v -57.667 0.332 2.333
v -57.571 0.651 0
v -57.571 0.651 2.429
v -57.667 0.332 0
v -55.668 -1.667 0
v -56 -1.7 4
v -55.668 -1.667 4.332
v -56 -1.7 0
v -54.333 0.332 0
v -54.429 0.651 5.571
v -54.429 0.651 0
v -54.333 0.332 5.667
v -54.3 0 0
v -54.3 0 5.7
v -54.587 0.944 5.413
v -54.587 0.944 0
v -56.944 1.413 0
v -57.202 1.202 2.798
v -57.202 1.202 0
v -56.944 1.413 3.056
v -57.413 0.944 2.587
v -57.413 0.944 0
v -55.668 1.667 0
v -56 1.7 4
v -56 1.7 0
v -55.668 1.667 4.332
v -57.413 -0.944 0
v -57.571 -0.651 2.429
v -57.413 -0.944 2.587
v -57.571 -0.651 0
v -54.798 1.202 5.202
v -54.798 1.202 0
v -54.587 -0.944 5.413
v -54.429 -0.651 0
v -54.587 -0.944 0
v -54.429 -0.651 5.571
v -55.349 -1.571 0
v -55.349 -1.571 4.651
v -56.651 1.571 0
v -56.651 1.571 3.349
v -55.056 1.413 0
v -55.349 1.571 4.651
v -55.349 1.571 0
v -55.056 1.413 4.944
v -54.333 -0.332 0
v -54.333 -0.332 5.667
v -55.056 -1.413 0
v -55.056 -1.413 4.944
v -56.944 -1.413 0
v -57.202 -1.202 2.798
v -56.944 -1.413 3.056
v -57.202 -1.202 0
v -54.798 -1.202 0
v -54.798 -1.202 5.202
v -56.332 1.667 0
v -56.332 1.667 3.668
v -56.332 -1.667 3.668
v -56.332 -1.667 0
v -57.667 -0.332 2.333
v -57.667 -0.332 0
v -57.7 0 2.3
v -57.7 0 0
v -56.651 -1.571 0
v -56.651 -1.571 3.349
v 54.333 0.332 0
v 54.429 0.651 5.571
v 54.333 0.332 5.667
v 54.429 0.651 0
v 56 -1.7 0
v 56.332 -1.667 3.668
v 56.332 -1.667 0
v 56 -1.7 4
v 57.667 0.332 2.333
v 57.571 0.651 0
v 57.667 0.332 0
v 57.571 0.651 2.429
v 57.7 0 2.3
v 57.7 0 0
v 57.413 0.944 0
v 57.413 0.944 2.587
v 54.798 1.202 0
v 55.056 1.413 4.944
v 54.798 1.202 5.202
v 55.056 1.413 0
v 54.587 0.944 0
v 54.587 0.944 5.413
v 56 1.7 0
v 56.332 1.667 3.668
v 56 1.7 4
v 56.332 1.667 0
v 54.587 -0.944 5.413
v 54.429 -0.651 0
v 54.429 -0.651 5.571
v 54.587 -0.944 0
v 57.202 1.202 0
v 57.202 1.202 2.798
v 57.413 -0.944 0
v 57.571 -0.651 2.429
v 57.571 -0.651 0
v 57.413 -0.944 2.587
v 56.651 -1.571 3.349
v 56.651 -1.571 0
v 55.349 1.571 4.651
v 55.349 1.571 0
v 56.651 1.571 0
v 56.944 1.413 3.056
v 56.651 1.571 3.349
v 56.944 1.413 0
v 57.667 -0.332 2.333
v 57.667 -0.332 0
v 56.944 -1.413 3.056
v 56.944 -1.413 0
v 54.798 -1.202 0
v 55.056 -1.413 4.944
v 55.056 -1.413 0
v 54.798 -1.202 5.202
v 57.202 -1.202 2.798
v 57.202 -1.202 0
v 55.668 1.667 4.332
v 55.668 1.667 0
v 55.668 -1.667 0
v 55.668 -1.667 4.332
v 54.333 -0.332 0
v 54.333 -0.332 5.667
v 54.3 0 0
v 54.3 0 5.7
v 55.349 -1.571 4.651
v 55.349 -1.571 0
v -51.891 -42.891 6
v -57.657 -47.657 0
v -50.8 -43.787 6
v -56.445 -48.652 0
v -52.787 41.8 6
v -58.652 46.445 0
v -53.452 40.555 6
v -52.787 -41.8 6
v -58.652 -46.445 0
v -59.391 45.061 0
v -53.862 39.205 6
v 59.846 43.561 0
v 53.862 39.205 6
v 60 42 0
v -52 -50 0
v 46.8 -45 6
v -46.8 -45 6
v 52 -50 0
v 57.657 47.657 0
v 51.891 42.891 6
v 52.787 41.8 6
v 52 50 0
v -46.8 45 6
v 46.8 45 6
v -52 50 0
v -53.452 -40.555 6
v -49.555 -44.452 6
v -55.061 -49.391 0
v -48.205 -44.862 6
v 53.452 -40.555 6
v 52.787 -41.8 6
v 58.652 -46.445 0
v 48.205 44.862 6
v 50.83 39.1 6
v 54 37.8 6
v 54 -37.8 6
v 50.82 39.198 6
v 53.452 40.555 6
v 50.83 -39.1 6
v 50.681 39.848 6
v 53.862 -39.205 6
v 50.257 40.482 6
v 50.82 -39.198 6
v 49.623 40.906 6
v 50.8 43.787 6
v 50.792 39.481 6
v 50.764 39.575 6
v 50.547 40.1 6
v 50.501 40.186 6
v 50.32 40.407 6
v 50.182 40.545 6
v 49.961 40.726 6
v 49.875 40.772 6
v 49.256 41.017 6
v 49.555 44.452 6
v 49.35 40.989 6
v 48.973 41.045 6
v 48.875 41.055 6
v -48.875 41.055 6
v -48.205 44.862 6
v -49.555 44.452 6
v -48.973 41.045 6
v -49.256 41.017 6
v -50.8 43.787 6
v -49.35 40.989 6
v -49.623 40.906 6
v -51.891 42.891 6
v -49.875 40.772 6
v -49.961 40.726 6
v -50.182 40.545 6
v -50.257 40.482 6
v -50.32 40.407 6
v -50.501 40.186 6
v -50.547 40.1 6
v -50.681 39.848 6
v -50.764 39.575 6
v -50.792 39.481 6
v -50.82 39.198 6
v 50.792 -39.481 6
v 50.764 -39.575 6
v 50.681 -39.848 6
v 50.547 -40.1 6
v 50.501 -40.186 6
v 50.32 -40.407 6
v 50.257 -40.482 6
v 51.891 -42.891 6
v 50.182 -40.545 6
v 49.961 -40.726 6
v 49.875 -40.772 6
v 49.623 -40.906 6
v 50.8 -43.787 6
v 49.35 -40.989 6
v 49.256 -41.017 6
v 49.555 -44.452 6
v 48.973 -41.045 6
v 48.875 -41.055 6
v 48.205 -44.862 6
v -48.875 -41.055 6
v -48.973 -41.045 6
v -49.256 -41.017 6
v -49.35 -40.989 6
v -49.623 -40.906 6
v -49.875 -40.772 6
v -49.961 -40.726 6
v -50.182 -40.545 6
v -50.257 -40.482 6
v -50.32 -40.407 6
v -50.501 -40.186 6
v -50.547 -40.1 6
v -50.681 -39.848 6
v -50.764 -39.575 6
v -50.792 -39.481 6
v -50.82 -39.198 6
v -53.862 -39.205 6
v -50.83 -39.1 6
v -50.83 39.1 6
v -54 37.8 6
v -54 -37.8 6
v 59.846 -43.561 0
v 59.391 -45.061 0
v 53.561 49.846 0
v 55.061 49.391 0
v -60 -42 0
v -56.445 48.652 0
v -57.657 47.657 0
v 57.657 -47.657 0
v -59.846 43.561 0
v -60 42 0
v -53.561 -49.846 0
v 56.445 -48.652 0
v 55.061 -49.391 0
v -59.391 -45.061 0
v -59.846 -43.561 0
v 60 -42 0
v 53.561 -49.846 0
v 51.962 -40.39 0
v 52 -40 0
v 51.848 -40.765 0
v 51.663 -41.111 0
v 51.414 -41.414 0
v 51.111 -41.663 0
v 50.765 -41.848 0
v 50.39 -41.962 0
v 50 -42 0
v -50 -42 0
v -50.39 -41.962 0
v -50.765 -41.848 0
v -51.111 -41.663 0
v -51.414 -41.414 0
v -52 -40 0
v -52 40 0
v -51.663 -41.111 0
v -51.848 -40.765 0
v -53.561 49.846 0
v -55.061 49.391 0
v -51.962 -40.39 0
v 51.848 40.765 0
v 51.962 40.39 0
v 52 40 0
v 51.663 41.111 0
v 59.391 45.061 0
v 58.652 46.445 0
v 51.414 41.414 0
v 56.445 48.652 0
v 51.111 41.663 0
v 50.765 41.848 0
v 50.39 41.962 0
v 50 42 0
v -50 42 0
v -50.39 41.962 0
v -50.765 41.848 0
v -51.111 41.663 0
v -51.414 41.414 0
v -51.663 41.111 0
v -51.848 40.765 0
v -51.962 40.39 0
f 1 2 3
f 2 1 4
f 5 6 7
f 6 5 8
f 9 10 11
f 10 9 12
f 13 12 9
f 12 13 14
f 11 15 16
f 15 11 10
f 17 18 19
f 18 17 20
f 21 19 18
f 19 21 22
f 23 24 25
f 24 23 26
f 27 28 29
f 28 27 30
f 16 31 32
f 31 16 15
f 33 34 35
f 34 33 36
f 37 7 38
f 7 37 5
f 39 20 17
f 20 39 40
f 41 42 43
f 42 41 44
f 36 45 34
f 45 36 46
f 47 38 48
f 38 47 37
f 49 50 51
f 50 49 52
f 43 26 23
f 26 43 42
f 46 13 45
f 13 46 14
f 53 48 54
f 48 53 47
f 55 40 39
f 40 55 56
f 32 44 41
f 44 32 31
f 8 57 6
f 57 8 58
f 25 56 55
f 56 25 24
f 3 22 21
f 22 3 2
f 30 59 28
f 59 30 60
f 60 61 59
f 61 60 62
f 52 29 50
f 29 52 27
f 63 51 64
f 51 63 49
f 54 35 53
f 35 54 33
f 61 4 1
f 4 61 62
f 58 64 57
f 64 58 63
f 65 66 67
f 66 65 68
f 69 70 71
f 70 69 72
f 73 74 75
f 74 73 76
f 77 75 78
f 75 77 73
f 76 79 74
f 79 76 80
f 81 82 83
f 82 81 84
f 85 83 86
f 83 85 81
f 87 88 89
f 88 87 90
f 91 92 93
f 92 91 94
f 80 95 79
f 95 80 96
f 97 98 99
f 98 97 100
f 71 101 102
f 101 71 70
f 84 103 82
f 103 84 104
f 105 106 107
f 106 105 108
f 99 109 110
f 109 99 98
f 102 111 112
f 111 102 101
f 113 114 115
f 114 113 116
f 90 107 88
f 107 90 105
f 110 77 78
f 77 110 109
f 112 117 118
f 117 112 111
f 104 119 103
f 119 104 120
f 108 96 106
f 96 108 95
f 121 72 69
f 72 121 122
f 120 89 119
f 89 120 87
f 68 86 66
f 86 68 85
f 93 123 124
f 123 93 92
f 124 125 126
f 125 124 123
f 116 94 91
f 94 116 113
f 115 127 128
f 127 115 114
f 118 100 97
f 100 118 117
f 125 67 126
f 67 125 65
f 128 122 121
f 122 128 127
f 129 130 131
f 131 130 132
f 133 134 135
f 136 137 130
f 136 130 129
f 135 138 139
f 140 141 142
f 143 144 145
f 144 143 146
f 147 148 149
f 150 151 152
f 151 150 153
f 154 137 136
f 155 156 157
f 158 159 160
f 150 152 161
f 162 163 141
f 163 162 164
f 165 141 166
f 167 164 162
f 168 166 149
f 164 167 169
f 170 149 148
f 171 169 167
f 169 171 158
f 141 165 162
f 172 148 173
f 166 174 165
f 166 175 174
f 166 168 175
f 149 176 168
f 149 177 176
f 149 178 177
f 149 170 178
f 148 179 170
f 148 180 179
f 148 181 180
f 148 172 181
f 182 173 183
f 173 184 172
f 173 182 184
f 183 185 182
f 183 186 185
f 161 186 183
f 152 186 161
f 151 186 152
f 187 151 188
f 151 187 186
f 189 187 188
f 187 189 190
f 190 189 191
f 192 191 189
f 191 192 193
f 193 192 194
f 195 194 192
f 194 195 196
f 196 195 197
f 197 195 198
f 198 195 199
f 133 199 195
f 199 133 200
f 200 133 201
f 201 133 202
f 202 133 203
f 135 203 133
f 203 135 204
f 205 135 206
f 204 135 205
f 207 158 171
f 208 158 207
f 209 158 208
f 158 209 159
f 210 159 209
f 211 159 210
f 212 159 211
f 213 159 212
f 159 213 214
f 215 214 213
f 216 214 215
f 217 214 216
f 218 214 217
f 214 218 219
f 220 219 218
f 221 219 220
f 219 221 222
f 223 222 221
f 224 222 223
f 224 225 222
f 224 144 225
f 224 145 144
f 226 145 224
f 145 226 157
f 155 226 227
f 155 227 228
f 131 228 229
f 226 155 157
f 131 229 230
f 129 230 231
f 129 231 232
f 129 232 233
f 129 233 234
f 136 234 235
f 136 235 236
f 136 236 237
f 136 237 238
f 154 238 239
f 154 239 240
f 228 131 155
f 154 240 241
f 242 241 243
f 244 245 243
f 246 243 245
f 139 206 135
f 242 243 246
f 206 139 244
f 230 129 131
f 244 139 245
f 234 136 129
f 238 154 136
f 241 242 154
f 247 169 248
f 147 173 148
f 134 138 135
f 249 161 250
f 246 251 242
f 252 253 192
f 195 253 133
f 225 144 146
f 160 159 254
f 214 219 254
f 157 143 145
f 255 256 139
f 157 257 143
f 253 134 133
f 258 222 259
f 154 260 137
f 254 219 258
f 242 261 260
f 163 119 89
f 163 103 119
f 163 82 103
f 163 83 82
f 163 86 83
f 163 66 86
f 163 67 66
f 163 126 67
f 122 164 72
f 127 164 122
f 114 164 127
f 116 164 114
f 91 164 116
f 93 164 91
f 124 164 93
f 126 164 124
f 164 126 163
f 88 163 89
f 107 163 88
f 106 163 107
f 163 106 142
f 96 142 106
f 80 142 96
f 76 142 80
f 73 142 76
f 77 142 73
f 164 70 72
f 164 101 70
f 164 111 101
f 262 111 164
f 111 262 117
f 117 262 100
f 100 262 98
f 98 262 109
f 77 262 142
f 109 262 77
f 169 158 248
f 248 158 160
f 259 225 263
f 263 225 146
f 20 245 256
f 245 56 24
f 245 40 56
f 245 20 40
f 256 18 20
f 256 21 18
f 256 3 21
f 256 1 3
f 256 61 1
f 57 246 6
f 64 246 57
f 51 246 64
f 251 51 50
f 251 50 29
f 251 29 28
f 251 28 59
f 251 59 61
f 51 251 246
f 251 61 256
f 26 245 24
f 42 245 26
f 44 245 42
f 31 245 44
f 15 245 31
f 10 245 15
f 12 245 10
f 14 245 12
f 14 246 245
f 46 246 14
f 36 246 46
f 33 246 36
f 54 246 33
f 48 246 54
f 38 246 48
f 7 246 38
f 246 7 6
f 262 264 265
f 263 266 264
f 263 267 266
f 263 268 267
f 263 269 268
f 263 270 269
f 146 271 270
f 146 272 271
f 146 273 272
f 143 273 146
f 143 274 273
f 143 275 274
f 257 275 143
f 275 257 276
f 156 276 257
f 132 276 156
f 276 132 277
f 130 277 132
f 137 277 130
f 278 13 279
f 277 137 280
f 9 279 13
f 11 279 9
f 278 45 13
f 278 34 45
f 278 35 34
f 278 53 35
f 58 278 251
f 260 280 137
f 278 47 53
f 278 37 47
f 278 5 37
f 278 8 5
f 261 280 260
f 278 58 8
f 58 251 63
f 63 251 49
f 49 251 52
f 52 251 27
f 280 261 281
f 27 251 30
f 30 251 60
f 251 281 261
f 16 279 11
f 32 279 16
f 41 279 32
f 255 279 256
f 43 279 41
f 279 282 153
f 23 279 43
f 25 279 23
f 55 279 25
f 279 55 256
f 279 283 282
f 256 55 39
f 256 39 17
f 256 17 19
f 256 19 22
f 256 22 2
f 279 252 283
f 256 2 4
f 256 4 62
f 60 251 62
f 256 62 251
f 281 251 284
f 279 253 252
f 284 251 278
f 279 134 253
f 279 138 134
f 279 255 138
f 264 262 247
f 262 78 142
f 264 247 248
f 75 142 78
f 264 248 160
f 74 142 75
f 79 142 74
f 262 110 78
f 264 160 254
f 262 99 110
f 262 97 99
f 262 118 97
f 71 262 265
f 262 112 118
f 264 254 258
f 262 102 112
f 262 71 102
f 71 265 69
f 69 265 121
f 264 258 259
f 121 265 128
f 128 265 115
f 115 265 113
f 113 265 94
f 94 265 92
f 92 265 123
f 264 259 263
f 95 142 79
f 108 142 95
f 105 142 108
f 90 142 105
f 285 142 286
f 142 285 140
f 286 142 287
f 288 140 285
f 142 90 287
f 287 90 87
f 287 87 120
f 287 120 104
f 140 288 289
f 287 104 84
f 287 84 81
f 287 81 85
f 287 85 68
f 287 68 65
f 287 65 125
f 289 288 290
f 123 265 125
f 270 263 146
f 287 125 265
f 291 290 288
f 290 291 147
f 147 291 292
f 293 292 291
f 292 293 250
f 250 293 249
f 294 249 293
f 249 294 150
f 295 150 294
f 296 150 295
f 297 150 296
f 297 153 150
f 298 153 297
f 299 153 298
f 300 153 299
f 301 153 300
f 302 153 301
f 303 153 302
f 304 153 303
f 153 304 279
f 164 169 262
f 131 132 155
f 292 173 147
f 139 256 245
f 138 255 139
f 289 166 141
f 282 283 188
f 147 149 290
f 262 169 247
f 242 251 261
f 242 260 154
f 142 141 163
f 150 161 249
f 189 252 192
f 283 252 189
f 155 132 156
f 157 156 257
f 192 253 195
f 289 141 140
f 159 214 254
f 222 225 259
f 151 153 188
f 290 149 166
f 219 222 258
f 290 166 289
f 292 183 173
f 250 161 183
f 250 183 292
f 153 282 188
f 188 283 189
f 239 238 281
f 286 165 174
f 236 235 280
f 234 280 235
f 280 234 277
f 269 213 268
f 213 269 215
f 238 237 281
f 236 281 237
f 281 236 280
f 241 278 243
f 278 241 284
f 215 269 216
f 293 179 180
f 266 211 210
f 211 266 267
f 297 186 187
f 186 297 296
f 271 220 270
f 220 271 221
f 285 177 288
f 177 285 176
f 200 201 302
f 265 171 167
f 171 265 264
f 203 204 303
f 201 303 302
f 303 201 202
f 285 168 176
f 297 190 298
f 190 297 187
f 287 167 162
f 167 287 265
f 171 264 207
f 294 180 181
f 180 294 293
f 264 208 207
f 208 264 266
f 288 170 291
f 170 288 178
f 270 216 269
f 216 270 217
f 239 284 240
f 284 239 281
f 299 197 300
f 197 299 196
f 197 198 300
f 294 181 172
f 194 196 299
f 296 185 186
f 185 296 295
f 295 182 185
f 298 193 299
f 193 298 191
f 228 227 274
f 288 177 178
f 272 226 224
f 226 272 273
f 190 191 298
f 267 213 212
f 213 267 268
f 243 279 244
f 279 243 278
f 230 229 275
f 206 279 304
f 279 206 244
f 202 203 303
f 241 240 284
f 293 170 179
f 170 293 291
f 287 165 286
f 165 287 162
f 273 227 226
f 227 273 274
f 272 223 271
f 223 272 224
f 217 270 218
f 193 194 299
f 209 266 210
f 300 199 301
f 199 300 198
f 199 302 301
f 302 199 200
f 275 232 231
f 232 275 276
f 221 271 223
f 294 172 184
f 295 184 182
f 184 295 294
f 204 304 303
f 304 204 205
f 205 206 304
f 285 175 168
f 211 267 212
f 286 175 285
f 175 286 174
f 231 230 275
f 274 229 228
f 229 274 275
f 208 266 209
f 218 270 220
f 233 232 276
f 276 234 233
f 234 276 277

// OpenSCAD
$fn = 32;

// ----------------------------------------------------------------------
// Display bezel: 120 x 100 mm frame, opening 104x84 mm
// ----------------------------------------------------------------------

// --- parameters (mm) ---
length = 120;             // frame outside length, X
width = 100;              // frame outside width, Y
frame_w = 8;              // frame width
thickness = 6;            // frame thickness
corner_r = 8;             // outside corner radius
chamfer = 0.9;            // outer wall taper
funnel = 0.97;            // inner opening taper
opening_l = 104;          // opening length
opening_w = 84;           // opening width
inner_r = 2;              // opening corner radius
hole_d = 3.4;             // mounting screw clearance
holes_per_side = 1;       // holes per short side
hole_inset = 4;           // hole centre inset from the outside edge

/* rounded-rectangle outlines, generated with loops */
module rounded_ring(l_nom, w_nom, r) {
  hull() {
    for (sx = [-1, 1]) for (sy = [-1, 1])
      translate([sx * (l_nom / 2 - r), sy * (w_nom / 2 - r)]) circle(r = r);
  }
}

difference() {
  /* frame body, drafted so the outer edge is a variable-depth chamfer */
  linear_extrude(height = thickness, scale = chamfer)
    rounded_ring(length, width, corner_r);
  /* viewing opening, drafted the other way for a funnel edge */
  linear_extrude(height = thickness + 2, scale = funnel)
    translate([0, 0, -1]) rounded_ring(opening_l, opening_w, inner_r);
  /* mounting screws through the frame lands */
  for (sx = [-1, 1]) for (i = [1 : holes_per_side])
    translate([sx * (length / 2 - hole_inset),
               (i - (holes_per_side + 1) / 2) * width * 0.5, -1])
      cylinder(h = thickness + 2, d = hole_d);
}
